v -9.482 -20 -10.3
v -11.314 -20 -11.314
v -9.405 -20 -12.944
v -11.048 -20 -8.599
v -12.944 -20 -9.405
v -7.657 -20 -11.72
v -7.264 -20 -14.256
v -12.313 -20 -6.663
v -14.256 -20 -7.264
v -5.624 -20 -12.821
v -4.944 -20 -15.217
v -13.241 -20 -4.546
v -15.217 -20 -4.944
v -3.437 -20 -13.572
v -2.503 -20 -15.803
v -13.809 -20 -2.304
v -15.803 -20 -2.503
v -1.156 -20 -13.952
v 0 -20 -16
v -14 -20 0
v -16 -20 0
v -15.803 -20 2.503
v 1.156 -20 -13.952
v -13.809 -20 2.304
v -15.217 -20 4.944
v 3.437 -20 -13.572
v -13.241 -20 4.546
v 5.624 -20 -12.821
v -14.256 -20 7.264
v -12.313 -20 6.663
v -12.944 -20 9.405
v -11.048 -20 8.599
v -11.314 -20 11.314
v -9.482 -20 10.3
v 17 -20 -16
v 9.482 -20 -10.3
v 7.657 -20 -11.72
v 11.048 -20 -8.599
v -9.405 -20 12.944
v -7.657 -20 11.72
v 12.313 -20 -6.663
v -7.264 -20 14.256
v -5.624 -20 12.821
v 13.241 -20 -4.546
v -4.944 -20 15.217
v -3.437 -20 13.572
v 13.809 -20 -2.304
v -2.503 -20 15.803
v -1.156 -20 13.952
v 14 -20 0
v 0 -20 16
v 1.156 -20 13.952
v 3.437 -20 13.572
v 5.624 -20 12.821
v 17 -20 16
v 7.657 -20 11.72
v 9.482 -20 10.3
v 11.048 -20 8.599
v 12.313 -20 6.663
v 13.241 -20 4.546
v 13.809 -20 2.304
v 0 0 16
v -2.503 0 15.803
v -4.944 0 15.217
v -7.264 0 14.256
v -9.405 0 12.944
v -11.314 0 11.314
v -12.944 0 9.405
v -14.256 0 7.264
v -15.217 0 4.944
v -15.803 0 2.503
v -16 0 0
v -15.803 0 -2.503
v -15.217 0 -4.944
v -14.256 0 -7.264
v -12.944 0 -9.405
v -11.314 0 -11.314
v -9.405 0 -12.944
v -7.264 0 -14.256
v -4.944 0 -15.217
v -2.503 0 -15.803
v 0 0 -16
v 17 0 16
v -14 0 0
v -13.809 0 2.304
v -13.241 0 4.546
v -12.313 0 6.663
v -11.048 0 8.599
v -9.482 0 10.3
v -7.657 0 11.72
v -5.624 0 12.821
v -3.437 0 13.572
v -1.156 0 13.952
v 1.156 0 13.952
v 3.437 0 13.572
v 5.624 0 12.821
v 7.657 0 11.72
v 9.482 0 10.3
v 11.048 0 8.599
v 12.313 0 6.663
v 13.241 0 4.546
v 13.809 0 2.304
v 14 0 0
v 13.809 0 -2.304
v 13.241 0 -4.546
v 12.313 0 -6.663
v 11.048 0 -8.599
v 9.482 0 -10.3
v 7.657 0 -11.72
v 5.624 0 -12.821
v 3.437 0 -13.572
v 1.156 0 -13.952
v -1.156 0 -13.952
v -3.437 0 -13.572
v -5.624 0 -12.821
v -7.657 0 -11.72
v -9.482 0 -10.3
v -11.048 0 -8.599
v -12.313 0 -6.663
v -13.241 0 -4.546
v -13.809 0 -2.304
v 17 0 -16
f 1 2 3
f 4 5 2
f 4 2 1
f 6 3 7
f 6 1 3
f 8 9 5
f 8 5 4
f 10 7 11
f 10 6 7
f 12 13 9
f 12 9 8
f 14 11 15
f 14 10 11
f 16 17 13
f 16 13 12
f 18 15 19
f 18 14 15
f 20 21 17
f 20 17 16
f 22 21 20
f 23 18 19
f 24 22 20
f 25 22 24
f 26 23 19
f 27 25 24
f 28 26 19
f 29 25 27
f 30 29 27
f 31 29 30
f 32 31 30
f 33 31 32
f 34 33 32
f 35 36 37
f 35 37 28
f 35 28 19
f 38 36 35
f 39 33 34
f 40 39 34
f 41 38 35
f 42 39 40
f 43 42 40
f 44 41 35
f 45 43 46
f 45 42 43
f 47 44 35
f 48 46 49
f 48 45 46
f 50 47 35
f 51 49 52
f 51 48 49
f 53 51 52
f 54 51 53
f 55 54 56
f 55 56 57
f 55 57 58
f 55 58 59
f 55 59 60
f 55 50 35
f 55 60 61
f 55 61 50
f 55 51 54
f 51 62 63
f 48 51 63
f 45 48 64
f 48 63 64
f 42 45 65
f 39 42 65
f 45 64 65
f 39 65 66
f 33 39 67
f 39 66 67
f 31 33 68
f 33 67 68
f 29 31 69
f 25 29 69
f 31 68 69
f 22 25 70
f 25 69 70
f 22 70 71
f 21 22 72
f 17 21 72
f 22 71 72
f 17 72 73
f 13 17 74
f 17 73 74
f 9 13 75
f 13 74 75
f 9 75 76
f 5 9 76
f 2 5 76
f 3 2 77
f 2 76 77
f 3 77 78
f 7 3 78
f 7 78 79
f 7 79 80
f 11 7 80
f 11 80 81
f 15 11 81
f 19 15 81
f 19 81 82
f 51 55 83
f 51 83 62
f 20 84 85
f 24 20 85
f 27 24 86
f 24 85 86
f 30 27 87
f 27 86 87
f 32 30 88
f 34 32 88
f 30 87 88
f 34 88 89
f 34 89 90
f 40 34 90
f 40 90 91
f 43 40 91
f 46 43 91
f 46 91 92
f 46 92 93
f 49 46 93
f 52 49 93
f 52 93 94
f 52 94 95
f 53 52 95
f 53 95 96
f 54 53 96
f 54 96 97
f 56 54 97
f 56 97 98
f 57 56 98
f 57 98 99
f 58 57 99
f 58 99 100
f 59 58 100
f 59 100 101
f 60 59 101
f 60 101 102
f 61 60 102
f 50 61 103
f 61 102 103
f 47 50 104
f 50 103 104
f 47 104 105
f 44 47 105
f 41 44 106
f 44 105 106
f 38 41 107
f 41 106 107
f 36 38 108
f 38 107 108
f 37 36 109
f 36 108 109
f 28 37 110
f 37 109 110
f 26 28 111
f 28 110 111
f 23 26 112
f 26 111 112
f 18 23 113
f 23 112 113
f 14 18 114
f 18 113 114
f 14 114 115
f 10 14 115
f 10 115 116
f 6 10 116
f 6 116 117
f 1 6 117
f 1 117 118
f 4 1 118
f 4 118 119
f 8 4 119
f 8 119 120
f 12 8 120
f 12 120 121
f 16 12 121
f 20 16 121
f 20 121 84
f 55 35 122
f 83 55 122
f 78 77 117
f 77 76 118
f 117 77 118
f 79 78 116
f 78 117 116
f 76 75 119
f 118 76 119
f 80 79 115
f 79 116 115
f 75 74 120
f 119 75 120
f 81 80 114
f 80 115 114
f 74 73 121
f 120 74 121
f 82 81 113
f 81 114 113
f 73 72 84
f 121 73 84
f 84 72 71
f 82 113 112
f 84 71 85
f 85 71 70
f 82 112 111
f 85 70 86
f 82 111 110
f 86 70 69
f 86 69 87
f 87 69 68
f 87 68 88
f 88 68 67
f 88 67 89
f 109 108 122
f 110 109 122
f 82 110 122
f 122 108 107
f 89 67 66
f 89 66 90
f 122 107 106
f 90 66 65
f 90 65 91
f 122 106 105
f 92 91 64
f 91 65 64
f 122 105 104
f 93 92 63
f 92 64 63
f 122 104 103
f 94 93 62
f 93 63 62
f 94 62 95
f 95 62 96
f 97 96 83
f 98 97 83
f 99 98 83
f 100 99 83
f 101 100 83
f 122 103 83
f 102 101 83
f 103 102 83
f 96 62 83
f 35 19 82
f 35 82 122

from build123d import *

# Parameters (mm, degrees)
F0_R      = 16
F0_R_2    = 10.5
F1_DEPTH  = 20
F2_R      = 12.5
F3_DEPTH  = 15
F4_DEPTH  = 15.001
F5_R      = 14
F6_DEPTH  = 15
F8_W      = 20
F8_H      = 16
F9_DEPTH  = 2
F11_DEPTH = 20
F14_DEPTH = 20
F15_DEPTH = 5.001


with BuildPart() as f1:
    # F0 (on Front) → F1 (new body)
    with BuildSketch(Plane.XZ):
        Circle(F0_R)
        Circle(F0_R_2, mode=Mode.SUBTRACT)
    extrude(amount=F1_DEPTH)

    # F2 (on face) → F3 (join)
    with BuildSketch(Plane.XZ.offset(20)):
        Circle(F2_R)
    extrude(amount=-F3_DEPTH)

    # F4 (cut, through all): a face of the model
    f4_faces = [f1.faces().sort_by_distance(p)[0] for p in [
        (0, -5, 0),
    ]]
    extrude(f4_faces, amount=-F4_DEPTH, mode=Mode.SUBTRACT)

    # F5 (on face) → F6 (cut)
    with BuildSketch(Plane(origin=(0, 0, 0), x_dir=(-1, 0, 0), z_dir=(0, 1, 0))):
        Circle(F5_R)
    extrude(amount=-F6_DEPTH, mode=Mode.SUBTRACT)

    # F8 (on offset) → F9 (join)
    with BuildSketch(Plane.YZ.offset(15)):
        with Locations((-10, -8)):
            Rectangle(F8_W, F8_H)
        with Locations((-10, 8)):
            Rectangle(F8_W, F8_H)
    extrude(amount=F9_DEPTH)

    # F10 (on face) → F11 (join)
    with BuildSketch(Plane.XZ.offset(20)):
        with BuildLine():
            Line((15, 16), (0, 16))
            ThreePointArc((0, 16), (9.1355287257, 13.1355287257), (15, 5.5677643628))
            Line((15, 5.5677643628), (15, 16))
        make_face()
    extrude(amount=-F11_DEPTH)

    # F13 (on face) → F14 (join)
    with BuildSketch(Plane.XZ.offset(20)):
        with BuildLine():
            Line((0, -16), (15, -16))
            Line((15, -16), (15, -5.5677643628))
            ThreePointArc((15, -5.5677643628), (9.1355287257, -13.1355287257), (0, -16))
        make_face()
    extrude(amount=-F14_DEPTH)

    # F15 (cut, through all): a face of the model
    f15_faces = [f1.faces().sort_by_distance(p)[0] for p in [
        (13.6040202025, -15, 0),
    ]]
    extrude(f15_faces, amount=-F15_DEPTH, mode=Mode.SUBTRACT)


solid = f1.part
